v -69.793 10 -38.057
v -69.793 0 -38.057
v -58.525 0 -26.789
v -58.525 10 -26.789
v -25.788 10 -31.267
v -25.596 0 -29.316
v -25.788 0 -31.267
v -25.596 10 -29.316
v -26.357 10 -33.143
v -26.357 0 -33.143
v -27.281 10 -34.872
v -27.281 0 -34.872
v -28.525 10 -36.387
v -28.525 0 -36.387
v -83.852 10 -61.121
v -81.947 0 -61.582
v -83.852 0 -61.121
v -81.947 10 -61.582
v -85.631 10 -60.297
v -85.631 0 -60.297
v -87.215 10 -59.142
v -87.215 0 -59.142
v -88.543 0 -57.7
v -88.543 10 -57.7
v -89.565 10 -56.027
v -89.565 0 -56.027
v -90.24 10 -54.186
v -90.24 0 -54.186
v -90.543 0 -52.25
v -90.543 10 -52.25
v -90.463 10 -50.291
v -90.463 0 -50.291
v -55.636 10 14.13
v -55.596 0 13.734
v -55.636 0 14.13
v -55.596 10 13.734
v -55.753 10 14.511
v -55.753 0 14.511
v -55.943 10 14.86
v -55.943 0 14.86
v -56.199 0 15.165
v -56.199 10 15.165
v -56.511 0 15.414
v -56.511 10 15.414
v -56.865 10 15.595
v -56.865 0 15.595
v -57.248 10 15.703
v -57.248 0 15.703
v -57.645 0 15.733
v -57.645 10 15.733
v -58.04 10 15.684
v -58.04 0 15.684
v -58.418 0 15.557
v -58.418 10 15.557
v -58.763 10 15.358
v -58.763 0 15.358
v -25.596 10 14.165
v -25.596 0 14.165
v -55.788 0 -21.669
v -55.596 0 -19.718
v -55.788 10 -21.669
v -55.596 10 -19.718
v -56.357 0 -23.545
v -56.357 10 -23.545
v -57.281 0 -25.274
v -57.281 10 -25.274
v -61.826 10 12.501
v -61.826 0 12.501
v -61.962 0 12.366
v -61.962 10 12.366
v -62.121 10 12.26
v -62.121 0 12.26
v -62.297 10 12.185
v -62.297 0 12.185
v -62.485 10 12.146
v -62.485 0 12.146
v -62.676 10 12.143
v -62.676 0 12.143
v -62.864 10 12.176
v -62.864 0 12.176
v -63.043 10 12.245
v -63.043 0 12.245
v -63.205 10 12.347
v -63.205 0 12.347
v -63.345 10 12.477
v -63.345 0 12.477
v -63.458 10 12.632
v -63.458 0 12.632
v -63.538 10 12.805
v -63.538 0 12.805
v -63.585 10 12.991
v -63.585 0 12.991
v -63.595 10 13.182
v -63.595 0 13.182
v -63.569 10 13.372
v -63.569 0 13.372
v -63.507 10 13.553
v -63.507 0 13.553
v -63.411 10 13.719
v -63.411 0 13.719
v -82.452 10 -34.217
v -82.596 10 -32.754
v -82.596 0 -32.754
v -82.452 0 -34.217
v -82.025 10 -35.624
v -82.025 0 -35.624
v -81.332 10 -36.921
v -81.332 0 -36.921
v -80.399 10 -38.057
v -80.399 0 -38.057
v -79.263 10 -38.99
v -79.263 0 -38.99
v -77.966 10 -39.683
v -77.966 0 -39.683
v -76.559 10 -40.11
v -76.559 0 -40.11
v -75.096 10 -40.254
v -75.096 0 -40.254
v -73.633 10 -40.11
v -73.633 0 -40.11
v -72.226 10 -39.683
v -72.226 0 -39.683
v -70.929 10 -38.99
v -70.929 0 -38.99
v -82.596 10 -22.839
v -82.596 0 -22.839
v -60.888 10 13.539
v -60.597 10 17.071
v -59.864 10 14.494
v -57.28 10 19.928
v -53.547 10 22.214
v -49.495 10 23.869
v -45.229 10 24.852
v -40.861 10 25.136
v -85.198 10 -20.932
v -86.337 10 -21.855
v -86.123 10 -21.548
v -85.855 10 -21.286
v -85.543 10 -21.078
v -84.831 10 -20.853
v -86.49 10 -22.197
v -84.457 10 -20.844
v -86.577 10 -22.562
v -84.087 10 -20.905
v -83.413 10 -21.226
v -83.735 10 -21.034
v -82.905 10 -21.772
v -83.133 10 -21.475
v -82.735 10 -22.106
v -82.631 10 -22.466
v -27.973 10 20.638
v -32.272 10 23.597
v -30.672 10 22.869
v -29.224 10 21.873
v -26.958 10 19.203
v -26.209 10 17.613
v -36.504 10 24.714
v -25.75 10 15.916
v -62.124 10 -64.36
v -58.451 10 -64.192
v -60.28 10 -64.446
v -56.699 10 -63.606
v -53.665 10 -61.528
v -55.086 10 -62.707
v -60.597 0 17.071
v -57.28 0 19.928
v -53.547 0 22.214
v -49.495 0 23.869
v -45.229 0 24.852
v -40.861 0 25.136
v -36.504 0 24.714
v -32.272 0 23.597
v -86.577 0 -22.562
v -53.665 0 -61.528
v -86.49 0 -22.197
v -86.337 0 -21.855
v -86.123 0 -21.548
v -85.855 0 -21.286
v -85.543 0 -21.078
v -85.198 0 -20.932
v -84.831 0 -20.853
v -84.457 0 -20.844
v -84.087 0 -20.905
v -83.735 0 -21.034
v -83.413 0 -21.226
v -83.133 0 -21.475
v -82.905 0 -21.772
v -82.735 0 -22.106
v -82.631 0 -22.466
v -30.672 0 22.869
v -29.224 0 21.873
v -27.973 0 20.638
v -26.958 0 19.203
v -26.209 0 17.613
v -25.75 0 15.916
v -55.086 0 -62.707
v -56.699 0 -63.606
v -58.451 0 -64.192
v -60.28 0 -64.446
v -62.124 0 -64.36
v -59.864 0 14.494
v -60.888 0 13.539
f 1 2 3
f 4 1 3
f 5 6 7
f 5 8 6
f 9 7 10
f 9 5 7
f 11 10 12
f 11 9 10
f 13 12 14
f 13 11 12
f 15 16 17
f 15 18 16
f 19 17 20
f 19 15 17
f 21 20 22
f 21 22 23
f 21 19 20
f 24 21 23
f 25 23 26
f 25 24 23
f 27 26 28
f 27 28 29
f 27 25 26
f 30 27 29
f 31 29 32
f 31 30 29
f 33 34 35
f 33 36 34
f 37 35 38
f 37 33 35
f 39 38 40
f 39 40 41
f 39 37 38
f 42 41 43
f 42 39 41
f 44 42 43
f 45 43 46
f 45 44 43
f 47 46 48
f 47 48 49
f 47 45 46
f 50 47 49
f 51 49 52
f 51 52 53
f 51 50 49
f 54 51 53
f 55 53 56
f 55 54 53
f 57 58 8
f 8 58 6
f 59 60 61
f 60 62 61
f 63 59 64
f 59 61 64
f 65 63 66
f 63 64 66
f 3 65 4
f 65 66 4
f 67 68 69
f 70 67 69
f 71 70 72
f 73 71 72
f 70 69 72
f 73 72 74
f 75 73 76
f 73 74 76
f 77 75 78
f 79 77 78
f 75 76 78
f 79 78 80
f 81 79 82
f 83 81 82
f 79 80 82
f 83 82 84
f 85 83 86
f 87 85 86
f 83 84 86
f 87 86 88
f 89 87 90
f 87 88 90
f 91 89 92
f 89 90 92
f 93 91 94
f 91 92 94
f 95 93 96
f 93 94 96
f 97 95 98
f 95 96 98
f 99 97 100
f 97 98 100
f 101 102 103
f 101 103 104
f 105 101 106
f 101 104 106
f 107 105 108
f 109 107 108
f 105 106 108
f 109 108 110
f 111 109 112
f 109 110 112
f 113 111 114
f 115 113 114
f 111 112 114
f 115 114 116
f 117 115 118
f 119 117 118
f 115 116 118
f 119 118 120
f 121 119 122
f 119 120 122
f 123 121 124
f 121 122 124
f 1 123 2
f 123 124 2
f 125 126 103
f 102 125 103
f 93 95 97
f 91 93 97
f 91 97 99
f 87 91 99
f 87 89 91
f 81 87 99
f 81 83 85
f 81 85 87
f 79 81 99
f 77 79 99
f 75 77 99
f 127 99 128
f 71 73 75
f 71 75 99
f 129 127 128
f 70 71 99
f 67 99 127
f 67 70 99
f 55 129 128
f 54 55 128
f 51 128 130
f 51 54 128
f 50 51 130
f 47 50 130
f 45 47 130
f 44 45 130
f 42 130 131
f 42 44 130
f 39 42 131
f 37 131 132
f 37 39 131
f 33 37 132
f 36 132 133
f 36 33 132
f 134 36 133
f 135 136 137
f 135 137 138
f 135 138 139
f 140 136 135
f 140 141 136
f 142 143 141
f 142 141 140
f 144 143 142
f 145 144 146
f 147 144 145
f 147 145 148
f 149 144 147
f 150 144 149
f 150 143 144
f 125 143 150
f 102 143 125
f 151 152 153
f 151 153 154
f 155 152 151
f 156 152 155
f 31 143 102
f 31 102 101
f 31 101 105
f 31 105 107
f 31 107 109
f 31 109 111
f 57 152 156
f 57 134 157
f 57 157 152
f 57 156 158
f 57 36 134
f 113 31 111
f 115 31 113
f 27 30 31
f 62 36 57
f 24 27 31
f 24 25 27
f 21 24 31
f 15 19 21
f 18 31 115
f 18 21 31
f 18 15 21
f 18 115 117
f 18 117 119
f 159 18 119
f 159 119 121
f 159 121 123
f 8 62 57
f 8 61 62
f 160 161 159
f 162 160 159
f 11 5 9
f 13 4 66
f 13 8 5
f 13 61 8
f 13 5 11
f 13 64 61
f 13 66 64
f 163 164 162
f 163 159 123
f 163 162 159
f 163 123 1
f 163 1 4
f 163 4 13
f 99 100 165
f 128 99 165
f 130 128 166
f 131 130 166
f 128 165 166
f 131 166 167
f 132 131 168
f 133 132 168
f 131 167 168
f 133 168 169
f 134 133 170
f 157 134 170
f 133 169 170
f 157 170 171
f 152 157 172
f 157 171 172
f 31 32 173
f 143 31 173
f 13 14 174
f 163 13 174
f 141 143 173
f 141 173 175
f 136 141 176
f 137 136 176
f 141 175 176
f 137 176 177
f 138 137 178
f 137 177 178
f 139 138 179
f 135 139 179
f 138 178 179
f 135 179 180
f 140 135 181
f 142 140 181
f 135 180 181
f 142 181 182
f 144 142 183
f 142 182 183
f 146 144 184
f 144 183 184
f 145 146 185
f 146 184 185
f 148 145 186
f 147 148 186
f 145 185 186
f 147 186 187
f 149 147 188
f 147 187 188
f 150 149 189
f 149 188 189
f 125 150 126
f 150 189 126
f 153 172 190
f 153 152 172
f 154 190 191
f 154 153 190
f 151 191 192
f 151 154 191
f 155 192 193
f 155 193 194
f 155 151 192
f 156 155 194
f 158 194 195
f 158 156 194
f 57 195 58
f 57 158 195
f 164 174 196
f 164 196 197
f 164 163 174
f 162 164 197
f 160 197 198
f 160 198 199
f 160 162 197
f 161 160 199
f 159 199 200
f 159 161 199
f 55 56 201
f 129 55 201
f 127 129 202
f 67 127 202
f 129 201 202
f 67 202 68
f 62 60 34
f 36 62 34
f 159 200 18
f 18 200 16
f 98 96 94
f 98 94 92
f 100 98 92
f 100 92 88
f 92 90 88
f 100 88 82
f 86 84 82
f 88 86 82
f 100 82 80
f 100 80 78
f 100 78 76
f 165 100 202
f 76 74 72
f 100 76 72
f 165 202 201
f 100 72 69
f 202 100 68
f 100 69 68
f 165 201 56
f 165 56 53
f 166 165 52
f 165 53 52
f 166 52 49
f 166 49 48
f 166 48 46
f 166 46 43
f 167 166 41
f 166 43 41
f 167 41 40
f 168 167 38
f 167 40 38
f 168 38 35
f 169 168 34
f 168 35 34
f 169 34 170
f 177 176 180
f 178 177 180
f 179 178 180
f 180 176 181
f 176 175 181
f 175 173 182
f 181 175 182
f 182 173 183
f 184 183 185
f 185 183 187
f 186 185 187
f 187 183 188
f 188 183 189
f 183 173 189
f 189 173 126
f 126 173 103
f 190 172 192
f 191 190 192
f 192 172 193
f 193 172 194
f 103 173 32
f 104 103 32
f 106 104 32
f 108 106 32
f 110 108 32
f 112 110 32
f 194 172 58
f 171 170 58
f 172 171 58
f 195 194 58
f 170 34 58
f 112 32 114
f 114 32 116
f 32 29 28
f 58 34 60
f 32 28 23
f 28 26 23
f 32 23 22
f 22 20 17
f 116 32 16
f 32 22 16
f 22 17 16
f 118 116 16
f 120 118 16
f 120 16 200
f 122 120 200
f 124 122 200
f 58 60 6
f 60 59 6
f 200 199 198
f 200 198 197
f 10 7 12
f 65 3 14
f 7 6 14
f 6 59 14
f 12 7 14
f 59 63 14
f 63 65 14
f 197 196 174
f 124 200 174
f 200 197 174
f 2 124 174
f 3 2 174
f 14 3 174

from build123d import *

# Parameters (mm, degrees)
SALIENTE_EXTRUIR1_DEPTH = 10
REDONDEO1_R             = 10
REDONDEO2_R             = 2


with BuildPart() as part:
    # Croquis1 → Saliente-Extruir1 (new body)
    with BuildSketch(Plane(origin=(0, 0, 0), x_dir=(1, 0, 0), z_dir=(0, 1, 0))):
        with BuildLine():
            Line((-55.595903629, 23.860424538), (-55.595903629, -17.139575462))
            ThreePointArc((-55.595903629, -17.139575462), (-58.988591813, -15.192930957), (-61.826379426, -12.500957814))
            ThreePointArc((-61.826379426, -12.500957814), (-63.205175994, -12.346614438), (-63.411183057, -13.718643208))
            ThreePointArc((-63.411183057, -13.718643208), (-45.832647936, -24.756705017), (-25.595903629, -20.139575462))
            Line((-25.595903629, -20.139575462), (-25.595903629, 33.458404285))
            Line((-25.595903629, 33.458404285), (-57.189073116, 65.051573772))
            Line((-57.189073116, 65.051573772), (-91.850363788, 60.194112608))
            Line((-91.850363788, 60.194112608), (-86.576548855, 22.561854481))
            ThreePointArc((-86.576548855, 22.561854481), (-84.456782192, 20.844267935), (-82.595903629, 22.839423374))
            Line((-82.595903629, 22.839423374), (-82.595903629, 32.75382282))
            ThreePointArc((-82.595903629, 32.75382282), (-77.966029372, 39.682919314), (-69.79260277, 38.057123679))
            Line((-69.79260277, 38.057123679), (-55.595903629, 23.860424538))
        make_face()
    extrude(amount=SALIENTE_EXTRUIR1_DEPTH)

    # Redondeo1
    redondeo1_edges = [part.edges().sort_by_distance(p)[0] for p in [
        (-25.595903629, 5, -33.458404285),
        (-25.595903629, 5, 20.139575462),
        (-55.595903629, 5, -23.860424538),
        (-91.850363788, 5, -60.194112608),
        (-57.189073116, 5, -65.051573772),
    ]]
    fillet(redondeo1_edges, radius=REDONDEO1_R)

    # Redondeo2
    redondeo2_edges = [part.edges().sort_by_distance(p)[0] for p in [
        (-55.595903629, 5, 17.139575462),
    ]]
    fillet(redondeo2_edges, radius=REDONDEO2_R)


solid = part.part
